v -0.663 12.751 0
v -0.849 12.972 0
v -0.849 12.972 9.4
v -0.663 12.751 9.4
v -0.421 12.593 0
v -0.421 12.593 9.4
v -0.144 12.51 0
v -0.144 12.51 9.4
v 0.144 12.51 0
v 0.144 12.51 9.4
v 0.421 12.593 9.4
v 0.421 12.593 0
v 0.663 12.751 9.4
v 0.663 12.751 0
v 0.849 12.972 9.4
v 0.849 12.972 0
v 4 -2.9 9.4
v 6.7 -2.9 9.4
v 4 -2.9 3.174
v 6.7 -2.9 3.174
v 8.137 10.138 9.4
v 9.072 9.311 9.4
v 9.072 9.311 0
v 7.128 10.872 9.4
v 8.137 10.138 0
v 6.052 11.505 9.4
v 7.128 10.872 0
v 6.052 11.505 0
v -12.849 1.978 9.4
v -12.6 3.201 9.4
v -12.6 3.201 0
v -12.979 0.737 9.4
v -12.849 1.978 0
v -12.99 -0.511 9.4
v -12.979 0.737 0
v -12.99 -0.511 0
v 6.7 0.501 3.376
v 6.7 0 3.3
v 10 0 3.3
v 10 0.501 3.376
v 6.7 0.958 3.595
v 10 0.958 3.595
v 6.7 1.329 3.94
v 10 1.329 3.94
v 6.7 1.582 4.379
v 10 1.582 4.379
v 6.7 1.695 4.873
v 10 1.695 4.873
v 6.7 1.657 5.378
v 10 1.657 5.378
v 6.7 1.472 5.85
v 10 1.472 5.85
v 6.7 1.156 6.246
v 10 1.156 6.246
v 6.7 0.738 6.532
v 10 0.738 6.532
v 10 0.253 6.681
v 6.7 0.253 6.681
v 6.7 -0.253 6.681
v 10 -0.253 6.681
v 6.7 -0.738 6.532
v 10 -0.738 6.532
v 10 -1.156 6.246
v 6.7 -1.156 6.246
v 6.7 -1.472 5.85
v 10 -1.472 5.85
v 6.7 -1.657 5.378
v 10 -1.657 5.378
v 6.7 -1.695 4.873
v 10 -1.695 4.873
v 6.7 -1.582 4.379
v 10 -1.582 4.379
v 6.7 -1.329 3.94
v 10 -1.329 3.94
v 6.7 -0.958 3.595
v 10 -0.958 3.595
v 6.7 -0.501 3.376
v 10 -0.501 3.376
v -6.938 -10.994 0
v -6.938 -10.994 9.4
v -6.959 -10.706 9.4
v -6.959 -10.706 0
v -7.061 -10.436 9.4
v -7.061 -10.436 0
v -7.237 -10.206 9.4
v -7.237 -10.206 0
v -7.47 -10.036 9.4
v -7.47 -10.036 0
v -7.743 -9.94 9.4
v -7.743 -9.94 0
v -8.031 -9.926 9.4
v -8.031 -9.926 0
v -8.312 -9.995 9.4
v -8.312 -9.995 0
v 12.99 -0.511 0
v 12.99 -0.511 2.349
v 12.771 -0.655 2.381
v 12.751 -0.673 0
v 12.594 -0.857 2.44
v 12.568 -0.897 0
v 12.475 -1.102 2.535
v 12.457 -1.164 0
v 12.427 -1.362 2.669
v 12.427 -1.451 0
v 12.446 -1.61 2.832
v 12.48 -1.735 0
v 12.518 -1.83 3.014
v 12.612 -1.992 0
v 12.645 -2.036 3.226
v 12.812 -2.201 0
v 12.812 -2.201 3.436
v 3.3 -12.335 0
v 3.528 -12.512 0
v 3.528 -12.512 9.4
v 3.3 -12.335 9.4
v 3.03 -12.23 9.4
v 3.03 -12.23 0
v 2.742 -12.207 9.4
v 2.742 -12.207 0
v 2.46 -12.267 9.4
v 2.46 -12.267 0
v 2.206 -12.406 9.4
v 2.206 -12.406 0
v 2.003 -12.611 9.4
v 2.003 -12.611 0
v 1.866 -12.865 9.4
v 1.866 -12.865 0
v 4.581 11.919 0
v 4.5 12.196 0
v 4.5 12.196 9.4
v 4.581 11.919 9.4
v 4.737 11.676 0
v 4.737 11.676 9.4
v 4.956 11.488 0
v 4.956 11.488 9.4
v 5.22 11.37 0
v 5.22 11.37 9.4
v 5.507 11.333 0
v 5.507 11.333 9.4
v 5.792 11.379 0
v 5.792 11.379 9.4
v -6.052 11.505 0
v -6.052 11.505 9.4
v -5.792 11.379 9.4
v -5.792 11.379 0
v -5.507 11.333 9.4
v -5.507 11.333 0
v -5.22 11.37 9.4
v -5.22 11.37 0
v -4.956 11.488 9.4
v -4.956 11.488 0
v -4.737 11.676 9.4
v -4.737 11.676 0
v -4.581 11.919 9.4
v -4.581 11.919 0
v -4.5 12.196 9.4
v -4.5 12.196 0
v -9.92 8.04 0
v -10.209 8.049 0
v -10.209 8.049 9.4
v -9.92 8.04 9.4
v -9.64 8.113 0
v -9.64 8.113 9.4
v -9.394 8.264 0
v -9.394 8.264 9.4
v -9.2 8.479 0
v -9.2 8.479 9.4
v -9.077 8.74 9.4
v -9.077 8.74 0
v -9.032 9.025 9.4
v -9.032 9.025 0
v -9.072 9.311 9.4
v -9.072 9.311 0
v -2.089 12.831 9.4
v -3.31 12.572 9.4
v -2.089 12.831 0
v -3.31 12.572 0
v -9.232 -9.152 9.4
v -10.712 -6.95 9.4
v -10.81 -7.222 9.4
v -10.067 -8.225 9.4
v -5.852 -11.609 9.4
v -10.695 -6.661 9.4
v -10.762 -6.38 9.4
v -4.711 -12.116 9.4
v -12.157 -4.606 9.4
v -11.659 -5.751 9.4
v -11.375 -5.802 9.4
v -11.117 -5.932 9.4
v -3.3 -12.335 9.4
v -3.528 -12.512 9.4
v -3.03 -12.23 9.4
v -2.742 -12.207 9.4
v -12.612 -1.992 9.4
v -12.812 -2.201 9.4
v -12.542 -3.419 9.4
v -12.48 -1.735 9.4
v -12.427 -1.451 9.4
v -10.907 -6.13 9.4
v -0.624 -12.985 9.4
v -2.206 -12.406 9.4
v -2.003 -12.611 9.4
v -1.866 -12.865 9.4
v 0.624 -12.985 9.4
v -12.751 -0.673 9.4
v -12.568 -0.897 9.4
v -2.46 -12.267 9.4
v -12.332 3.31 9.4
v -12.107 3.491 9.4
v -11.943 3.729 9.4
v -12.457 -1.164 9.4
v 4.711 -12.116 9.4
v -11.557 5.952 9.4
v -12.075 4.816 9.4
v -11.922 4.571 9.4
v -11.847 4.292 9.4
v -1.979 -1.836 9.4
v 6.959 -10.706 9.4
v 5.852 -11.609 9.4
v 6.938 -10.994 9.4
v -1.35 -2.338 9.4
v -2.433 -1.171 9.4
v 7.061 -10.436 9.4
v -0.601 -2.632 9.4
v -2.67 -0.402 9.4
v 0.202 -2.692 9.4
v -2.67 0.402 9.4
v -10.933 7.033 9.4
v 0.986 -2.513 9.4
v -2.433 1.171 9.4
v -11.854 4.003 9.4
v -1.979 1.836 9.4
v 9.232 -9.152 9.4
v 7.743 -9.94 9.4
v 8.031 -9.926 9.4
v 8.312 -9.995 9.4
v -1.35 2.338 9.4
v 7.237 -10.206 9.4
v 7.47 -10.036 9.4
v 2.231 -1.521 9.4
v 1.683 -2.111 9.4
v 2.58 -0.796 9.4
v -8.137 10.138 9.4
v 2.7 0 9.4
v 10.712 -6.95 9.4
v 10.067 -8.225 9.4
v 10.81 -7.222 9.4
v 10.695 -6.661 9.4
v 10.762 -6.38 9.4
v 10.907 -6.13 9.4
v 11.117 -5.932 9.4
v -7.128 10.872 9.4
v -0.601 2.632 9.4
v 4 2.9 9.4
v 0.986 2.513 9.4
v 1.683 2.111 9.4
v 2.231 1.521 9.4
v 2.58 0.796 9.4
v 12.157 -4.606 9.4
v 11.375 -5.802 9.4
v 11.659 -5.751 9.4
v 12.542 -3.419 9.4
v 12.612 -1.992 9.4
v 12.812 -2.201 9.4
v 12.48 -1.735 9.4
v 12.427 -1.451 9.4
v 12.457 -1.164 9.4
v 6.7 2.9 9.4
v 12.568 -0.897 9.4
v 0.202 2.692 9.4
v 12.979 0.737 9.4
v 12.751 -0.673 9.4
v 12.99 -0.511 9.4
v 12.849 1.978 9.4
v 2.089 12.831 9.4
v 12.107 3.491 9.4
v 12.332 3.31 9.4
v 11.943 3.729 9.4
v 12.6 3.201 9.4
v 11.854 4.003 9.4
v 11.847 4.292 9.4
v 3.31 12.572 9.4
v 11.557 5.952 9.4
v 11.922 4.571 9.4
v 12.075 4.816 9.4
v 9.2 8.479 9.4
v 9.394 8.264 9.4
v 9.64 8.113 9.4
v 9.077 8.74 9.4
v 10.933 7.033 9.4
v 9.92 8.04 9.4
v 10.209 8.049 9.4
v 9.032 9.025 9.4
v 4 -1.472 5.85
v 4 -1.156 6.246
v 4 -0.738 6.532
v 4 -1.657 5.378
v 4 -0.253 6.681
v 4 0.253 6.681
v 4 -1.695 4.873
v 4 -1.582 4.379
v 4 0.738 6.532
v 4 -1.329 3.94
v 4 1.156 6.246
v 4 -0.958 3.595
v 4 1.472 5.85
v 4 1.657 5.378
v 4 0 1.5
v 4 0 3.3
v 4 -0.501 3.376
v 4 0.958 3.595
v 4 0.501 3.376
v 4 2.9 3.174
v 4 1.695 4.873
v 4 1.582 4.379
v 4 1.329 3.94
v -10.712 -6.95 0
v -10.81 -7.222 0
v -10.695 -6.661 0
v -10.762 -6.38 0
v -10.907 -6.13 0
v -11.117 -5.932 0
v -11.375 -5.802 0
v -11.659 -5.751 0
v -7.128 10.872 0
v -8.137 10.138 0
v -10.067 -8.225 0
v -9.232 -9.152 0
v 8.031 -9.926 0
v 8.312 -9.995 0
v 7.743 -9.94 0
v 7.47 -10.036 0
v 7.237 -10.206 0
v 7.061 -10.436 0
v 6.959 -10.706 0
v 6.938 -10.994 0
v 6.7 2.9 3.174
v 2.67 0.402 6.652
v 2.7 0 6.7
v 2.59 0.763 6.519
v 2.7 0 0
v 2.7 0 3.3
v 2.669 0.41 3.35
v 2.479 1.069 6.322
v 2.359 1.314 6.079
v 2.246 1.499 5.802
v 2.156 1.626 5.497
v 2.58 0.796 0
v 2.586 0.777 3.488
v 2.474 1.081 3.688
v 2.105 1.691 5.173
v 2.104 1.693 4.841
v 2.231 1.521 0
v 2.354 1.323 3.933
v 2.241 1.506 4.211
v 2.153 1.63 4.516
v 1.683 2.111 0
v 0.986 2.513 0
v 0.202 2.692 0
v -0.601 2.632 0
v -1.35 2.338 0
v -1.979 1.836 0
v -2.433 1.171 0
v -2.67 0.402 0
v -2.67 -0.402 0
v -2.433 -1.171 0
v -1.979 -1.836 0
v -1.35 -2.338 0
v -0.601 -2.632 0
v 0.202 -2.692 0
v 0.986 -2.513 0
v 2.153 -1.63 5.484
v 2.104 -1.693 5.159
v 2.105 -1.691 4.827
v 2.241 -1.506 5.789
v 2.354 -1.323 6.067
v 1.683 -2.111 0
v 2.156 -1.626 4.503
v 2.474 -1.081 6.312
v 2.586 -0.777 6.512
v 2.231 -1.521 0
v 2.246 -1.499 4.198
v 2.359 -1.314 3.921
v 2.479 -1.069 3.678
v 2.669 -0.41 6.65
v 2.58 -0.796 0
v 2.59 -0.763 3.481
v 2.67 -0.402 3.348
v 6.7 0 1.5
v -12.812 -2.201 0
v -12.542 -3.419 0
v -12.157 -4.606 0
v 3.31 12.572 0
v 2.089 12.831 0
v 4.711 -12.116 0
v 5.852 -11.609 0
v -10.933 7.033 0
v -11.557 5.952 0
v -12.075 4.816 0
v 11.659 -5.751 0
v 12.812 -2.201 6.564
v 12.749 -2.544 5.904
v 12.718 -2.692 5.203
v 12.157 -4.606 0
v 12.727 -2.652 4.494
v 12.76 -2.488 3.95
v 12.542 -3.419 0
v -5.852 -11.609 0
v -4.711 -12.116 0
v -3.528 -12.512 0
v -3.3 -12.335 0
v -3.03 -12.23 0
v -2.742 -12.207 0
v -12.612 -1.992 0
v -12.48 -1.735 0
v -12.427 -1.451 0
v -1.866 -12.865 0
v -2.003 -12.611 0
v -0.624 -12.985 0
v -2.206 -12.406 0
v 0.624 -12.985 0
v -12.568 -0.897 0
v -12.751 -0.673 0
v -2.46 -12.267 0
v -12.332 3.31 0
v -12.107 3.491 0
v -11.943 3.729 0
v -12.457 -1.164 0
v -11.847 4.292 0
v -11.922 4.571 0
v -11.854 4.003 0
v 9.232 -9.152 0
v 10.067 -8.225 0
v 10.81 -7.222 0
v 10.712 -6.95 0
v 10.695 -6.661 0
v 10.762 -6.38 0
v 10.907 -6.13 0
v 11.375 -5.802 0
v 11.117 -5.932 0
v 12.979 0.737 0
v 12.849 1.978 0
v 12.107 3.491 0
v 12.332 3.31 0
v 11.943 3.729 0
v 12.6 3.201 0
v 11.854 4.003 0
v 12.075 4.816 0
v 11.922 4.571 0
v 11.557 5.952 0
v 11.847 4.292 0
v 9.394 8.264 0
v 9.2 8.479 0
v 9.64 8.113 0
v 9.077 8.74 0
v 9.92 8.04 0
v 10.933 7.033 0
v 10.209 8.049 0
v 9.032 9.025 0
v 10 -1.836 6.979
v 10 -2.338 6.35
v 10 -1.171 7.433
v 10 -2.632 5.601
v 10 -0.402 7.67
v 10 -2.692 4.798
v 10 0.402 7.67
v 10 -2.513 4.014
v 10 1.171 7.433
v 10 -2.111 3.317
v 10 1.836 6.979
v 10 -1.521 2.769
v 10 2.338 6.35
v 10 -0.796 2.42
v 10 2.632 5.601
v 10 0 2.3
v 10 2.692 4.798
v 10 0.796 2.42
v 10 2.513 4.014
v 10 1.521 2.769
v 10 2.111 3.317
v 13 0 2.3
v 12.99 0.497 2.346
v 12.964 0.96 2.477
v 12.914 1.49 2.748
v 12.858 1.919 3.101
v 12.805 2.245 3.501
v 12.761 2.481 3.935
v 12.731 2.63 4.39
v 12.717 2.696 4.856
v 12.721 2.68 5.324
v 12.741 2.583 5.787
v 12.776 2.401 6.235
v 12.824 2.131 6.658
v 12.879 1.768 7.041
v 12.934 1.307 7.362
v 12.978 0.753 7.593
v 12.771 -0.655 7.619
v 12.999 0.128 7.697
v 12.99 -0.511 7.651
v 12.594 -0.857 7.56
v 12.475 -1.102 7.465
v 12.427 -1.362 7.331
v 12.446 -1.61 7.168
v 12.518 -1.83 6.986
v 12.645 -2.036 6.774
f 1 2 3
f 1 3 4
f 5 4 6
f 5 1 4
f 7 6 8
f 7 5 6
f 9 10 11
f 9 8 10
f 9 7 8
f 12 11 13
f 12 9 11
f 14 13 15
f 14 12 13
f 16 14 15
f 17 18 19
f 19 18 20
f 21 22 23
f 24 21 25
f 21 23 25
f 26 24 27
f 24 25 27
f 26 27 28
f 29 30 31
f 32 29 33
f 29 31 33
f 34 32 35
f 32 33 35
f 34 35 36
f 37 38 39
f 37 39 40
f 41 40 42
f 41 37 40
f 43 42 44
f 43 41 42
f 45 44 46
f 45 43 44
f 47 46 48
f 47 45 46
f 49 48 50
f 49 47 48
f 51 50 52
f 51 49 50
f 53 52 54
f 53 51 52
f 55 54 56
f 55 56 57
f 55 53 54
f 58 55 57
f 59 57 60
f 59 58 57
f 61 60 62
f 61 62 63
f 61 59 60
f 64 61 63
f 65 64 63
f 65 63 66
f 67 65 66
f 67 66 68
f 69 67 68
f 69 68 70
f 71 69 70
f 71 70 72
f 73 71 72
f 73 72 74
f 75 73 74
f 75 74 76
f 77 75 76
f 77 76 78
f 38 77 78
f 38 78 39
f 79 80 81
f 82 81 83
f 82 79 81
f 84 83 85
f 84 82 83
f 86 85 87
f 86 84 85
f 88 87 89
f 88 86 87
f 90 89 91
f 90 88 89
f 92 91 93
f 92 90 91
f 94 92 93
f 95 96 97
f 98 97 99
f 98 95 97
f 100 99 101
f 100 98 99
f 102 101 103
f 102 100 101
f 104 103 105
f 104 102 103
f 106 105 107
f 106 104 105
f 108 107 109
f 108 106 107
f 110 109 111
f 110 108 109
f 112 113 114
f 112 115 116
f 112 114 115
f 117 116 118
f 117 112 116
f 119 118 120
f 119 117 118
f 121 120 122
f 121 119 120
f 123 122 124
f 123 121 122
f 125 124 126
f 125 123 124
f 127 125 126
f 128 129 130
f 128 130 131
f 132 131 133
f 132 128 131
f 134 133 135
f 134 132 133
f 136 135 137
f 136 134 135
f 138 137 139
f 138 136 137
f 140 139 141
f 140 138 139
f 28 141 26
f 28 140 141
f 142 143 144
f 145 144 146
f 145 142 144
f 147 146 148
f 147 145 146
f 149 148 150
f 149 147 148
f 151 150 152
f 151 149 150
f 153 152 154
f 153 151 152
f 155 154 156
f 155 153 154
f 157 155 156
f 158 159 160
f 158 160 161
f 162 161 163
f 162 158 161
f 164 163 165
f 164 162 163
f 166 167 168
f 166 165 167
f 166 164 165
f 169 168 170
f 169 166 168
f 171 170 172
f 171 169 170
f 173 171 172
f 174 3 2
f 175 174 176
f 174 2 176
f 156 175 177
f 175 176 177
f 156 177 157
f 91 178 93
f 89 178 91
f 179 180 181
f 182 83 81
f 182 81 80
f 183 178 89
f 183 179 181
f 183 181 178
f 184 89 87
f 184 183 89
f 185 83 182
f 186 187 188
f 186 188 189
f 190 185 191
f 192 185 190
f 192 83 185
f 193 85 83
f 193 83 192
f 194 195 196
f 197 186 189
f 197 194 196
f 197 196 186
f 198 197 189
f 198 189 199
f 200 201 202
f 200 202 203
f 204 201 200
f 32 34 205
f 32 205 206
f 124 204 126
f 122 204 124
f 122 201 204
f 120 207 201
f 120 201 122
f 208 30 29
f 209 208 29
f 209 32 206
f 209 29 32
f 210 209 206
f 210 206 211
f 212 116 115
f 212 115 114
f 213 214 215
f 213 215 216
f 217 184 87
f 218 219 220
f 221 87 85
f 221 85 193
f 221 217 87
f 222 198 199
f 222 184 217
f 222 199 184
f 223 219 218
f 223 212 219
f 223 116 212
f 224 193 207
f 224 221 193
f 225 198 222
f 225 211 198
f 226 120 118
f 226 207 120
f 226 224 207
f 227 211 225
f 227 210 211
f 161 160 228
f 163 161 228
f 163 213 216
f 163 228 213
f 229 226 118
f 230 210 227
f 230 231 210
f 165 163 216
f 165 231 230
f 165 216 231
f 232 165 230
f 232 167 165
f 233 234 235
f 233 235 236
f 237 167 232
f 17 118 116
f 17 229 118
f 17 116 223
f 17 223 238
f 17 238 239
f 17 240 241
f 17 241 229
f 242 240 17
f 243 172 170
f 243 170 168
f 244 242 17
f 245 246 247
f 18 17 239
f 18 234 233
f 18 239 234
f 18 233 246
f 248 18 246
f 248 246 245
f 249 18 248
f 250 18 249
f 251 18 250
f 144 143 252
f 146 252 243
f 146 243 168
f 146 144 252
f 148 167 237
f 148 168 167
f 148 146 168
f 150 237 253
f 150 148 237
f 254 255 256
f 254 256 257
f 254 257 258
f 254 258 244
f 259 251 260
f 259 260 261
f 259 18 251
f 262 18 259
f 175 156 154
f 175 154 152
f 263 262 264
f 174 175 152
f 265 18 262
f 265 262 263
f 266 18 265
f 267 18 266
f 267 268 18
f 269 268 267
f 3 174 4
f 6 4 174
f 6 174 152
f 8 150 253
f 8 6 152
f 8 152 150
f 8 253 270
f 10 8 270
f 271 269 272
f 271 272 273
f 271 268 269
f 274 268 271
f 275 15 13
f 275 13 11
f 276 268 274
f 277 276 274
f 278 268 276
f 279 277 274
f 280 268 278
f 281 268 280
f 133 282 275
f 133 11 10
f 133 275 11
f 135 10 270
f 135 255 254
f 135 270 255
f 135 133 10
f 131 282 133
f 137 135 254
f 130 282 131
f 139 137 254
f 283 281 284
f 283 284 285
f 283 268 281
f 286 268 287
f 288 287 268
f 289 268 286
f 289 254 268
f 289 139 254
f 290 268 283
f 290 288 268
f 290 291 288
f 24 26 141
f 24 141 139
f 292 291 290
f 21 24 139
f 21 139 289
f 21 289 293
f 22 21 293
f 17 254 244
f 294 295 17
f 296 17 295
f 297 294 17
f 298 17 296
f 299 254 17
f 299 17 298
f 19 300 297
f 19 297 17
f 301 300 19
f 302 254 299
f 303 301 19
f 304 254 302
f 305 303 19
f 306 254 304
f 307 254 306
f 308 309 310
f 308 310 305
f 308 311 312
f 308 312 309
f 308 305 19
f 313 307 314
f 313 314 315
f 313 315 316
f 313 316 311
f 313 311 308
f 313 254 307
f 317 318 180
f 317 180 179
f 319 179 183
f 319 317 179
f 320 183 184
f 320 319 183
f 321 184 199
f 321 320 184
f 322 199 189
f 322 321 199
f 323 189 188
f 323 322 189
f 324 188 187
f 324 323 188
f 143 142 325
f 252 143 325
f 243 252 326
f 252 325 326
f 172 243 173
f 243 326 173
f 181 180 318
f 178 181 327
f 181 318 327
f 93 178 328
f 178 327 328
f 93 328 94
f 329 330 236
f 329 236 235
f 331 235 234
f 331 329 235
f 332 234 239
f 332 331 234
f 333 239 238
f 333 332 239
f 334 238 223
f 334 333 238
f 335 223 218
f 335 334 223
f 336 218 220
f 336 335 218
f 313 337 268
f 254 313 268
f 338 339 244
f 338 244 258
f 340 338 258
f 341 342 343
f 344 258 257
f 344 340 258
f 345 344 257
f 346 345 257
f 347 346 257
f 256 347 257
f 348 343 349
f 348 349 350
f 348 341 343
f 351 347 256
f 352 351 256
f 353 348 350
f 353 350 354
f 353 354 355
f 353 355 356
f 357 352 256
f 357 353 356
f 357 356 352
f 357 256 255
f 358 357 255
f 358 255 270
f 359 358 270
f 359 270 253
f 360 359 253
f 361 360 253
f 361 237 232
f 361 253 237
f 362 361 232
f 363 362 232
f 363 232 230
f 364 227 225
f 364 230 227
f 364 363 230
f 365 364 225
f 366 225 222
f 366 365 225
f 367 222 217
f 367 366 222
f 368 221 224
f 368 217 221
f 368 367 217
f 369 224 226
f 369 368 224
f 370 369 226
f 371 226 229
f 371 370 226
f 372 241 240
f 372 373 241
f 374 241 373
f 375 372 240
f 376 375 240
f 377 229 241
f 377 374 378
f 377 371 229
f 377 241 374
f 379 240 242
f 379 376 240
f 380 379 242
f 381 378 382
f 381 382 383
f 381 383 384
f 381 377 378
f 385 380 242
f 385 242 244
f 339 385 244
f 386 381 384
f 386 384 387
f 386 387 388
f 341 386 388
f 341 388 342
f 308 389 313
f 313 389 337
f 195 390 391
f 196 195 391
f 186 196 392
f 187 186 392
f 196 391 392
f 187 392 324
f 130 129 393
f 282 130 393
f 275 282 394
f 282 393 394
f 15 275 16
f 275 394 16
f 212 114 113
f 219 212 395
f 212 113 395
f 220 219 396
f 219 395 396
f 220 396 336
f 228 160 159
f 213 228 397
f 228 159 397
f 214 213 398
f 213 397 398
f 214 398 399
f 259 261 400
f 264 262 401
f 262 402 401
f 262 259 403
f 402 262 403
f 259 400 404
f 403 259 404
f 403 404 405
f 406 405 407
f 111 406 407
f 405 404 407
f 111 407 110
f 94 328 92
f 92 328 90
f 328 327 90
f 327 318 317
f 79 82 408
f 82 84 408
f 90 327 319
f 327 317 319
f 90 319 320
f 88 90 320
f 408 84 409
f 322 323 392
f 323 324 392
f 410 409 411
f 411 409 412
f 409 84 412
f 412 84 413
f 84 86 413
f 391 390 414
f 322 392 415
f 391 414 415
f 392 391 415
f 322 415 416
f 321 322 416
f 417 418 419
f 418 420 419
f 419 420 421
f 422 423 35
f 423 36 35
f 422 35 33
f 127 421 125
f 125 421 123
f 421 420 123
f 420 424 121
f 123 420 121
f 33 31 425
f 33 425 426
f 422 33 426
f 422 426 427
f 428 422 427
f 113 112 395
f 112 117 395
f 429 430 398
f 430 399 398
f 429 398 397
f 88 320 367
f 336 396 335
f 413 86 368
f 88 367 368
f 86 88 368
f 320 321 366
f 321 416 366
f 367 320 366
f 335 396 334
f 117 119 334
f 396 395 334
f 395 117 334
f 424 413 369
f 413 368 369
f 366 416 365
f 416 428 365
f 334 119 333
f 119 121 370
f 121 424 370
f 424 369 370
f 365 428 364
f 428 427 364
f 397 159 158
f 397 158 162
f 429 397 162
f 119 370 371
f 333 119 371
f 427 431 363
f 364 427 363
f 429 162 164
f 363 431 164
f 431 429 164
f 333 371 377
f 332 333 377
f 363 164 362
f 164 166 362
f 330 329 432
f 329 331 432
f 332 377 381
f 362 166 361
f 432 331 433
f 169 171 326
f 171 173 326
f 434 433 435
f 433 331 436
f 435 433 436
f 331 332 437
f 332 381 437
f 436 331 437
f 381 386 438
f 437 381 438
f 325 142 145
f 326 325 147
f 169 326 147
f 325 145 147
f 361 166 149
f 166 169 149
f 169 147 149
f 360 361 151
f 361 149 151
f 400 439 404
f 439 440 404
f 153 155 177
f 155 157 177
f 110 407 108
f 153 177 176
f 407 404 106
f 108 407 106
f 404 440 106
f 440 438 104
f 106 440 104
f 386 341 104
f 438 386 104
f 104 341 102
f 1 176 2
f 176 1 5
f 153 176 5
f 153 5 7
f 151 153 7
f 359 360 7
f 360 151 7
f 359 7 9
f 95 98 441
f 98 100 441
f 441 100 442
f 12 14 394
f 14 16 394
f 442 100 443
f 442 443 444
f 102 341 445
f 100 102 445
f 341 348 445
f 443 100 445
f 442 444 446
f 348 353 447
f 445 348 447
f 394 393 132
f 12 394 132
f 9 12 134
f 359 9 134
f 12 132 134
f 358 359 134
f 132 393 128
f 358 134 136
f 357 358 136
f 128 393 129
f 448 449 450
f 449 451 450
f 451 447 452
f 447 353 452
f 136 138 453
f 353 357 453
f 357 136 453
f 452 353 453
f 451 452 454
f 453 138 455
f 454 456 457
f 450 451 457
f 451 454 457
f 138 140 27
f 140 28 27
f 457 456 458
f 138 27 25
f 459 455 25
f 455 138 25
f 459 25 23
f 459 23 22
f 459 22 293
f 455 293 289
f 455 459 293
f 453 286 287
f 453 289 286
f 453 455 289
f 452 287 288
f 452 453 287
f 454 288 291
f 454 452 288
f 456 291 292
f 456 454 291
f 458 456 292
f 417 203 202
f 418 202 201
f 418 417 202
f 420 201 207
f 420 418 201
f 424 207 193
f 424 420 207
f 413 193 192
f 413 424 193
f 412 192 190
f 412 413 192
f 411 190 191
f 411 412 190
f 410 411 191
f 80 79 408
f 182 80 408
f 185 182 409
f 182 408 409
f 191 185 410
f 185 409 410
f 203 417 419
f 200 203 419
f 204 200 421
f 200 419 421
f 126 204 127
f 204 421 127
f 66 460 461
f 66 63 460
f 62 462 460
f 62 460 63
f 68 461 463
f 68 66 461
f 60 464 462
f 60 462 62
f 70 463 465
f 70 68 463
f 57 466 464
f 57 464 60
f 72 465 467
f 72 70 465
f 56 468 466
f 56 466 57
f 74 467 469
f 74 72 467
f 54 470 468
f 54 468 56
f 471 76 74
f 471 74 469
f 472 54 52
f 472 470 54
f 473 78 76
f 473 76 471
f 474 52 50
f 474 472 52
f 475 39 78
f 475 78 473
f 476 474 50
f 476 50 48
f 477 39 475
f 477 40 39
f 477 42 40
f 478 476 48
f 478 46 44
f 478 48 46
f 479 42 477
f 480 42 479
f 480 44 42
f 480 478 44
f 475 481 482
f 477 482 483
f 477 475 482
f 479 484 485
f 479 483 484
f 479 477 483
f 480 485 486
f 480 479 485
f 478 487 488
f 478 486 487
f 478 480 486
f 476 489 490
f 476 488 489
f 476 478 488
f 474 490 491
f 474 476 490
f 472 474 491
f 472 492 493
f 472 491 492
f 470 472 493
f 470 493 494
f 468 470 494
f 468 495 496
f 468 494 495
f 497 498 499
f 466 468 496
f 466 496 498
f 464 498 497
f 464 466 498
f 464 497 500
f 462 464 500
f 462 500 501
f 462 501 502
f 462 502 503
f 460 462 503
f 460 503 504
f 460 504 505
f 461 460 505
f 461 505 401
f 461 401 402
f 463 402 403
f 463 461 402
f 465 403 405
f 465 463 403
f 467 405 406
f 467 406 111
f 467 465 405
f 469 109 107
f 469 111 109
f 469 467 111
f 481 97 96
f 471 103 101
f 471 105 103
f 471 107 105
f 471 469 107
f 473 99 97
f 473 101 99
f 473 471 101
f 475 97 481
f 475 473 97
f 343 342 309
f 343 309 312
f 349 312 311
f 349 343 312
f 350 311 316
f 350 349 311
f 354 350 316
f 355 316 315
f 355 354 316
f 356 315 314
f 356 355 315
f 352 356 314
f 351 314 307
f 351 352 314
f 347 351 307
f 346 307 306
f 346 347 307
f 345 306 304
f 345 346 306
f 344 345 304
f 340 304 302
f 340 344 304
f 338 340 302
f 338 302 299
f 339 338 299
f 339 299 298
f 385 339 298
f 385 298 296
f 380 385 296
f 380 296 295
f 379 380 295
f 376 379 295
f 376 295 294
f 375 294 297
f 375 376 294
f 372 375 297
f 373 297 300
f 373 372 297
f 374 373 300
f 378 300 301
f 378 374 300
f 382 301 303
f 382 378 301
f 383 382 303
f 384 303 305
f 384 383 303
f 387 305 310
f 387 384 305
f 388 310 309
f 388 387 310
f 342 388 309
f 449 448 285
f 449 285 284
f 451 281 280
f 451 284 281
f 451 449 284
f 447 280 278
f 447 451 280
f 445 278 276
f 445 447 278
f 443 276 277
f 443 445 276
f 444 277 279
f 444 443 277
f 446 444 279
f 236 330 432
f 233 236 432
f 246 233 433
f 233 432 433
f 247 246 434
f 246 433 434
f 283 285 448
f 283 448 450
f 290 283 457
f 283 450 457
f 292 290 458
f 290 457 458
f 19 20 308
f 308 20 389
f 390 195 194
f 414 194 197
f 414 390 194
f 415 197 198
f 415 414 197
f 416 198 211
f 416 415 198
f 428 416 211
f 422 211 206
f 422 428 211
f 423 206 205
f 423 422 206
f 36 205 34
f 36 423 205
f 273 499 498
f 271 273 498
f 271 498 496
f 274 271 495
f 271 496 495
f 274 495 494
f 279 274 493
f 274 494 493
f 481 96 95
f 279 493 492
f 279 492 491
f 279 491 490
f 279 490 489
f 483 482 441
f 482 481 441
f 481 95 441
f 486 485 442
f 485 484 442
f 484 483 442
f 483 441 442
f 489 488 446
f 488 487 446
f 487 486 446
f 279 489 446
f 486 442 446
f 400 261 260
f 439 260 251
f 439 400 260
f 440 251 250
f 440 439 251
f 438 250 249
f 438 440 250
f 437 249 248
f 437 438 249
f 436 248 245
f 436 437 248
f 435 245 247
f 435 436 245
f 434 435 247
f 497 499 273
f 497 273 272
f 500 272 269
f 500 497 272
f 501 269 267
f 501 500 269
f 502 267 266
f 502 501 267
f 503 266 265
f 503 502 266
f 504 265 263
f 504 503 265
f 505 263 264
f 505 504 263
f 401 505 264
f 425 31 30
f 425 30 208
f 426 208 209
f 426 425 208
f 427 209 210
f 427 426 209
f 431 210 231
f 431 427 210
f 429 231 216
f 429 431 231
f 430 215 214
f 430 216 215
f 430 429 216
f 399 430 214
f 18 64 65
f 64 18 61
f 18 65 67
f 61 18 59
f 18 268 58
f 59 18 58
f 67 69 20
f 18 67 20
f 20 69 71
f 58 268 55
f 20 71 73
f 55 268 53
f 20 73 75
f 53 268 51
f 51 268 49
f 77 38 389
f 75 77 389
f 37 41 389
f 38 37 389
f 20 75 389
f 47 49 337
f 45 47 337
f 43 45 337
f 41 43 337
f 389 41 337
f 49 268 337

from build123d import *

# Parameters (mm, degrees)
PAD007_DEPTH         = 2.7
CYLINDER1020_R       = 2.7
CYLINDER1020_DEPTH   = 10
CYLINDER1018_R       = 1.7
CYLINDER1018_DEPTH   = 10
CLONE023_PITCH_ANGLE = 90
CYLINDER1014_R       = 2.7
CYLINDER1014_DEPTH   = 100
CYLINDER1016_R       = 1
CYLINDER1016_DEPTH   = 10
ARRAY_COUNT          = 15
CYLINDER_R           = 13
CYLINDER_DEPTH       = 9.4


with BuildPart() as clone_of_m3nuthousingmaster001:
    # Sketch008 → Pad007 (new body)
    with BuildSketch(Plane(origin=(65, 30, 1.5), x_dir=(0, 0, 1), z_dir=(-1, 0, 0))):
        Polygon((0, 0), (1.674316, 2.9), (21.674316, 2.9), (21.674316, -2.9), (1.674316, -2.9), align=None)
    extrude(amount=PAD007_DEPTH)


with BuildPart() as clone_of_m3nuthousingmaster001_1:
    # Clone010 placement: moved
    add(clone_of_m3nuthousingmaster001.part.moved(Location((-58.3, -30, 0))))


with BuildPart() as cylinder1015:
    # Cylinder1020 → Cylinder1020 (new body)
    with BuildSketch(Plane.XY.offset(10)):
        Circle(CYLINDER1020_R)
    extrude(amount=CYLINDER1020_DEPTH)


with BuildPart() as clone_of_m3bolthead:
    # Cylinder1018 → Cylinder1018 (new body)
    with BuildSketch(Plane.XY):
        Circle(CYLINDER1018_R)
    extrude(amount=CYLINDER1018_DEPTH)

    # Fusion024: union Cylinder1015
    add(cylinder1015.part)


with BuildPart() as clone_of_m3bolthead_1:
    # Clone023 pitch: moved
    add(clone_of_m3bolthead.part.rotate(Axis((0, 0, 0), (0, 1, 0)), CLONE023_PITCH_ANGLE))


with BuildPart() as clone_of_m3bolthead_2:
    # Clone023 placement: moved
    add(clone_of_m3bolthead_1.part.moved(Location((0, 0, 5))))


with BuildPart() as fusion:
    # Cylinder1014 → Cylinder1014 (new body)
    with BuildSketch(Plane.XY):
        Circle(CYLINDER1014_R)
    extrude(amount=CYLINDER1014_DEPTH)

    # Fusion: union Clone of M3NutHousingMaster001, Clone of M3BoltHead
    add(clone_of_m3nuthousingmaster001_1.part)
    add(clone_of_m3bolthead_2.part)


with BuildPart() as array:
    # Cylinder1016 → Cylinder1016 (new body)
    with BuildSketch(Plane(origin=(0, 13.5, 0), x_dir=(1, 0, 0), z_dir=(0, 0, 1))):
        Circle(CYLINDER1016_R)
    extrude(amount=CYLINDER1016_DEPTH)

    # Array: Array ×15 about axis
    array_axis = Axis((0, 0, 0), (0, 0, 1))


with BuildPart() as array_1:
    add(array.part)
    for i in range(1, ARRAY_COUNT):
        add(array.part.rotate(array_axis, i * 360 / ARRAY_COUNT))


with BuildPart() as wheel:
    # Cylinder → Cylinder (new body)
    with BuildSketch(Plane.XY):
        Circle(CYLINDER_R)
    extrude(amount=CYLINDER_DEPTH)

    # Cut013: cut Array
    add(array_1.part, mode=Mode.SUBTRACT)

    # Cut019: cut Fusion
    add(fusion.part, mode=Mode.SUBTRACT)


solid = wheel.part
